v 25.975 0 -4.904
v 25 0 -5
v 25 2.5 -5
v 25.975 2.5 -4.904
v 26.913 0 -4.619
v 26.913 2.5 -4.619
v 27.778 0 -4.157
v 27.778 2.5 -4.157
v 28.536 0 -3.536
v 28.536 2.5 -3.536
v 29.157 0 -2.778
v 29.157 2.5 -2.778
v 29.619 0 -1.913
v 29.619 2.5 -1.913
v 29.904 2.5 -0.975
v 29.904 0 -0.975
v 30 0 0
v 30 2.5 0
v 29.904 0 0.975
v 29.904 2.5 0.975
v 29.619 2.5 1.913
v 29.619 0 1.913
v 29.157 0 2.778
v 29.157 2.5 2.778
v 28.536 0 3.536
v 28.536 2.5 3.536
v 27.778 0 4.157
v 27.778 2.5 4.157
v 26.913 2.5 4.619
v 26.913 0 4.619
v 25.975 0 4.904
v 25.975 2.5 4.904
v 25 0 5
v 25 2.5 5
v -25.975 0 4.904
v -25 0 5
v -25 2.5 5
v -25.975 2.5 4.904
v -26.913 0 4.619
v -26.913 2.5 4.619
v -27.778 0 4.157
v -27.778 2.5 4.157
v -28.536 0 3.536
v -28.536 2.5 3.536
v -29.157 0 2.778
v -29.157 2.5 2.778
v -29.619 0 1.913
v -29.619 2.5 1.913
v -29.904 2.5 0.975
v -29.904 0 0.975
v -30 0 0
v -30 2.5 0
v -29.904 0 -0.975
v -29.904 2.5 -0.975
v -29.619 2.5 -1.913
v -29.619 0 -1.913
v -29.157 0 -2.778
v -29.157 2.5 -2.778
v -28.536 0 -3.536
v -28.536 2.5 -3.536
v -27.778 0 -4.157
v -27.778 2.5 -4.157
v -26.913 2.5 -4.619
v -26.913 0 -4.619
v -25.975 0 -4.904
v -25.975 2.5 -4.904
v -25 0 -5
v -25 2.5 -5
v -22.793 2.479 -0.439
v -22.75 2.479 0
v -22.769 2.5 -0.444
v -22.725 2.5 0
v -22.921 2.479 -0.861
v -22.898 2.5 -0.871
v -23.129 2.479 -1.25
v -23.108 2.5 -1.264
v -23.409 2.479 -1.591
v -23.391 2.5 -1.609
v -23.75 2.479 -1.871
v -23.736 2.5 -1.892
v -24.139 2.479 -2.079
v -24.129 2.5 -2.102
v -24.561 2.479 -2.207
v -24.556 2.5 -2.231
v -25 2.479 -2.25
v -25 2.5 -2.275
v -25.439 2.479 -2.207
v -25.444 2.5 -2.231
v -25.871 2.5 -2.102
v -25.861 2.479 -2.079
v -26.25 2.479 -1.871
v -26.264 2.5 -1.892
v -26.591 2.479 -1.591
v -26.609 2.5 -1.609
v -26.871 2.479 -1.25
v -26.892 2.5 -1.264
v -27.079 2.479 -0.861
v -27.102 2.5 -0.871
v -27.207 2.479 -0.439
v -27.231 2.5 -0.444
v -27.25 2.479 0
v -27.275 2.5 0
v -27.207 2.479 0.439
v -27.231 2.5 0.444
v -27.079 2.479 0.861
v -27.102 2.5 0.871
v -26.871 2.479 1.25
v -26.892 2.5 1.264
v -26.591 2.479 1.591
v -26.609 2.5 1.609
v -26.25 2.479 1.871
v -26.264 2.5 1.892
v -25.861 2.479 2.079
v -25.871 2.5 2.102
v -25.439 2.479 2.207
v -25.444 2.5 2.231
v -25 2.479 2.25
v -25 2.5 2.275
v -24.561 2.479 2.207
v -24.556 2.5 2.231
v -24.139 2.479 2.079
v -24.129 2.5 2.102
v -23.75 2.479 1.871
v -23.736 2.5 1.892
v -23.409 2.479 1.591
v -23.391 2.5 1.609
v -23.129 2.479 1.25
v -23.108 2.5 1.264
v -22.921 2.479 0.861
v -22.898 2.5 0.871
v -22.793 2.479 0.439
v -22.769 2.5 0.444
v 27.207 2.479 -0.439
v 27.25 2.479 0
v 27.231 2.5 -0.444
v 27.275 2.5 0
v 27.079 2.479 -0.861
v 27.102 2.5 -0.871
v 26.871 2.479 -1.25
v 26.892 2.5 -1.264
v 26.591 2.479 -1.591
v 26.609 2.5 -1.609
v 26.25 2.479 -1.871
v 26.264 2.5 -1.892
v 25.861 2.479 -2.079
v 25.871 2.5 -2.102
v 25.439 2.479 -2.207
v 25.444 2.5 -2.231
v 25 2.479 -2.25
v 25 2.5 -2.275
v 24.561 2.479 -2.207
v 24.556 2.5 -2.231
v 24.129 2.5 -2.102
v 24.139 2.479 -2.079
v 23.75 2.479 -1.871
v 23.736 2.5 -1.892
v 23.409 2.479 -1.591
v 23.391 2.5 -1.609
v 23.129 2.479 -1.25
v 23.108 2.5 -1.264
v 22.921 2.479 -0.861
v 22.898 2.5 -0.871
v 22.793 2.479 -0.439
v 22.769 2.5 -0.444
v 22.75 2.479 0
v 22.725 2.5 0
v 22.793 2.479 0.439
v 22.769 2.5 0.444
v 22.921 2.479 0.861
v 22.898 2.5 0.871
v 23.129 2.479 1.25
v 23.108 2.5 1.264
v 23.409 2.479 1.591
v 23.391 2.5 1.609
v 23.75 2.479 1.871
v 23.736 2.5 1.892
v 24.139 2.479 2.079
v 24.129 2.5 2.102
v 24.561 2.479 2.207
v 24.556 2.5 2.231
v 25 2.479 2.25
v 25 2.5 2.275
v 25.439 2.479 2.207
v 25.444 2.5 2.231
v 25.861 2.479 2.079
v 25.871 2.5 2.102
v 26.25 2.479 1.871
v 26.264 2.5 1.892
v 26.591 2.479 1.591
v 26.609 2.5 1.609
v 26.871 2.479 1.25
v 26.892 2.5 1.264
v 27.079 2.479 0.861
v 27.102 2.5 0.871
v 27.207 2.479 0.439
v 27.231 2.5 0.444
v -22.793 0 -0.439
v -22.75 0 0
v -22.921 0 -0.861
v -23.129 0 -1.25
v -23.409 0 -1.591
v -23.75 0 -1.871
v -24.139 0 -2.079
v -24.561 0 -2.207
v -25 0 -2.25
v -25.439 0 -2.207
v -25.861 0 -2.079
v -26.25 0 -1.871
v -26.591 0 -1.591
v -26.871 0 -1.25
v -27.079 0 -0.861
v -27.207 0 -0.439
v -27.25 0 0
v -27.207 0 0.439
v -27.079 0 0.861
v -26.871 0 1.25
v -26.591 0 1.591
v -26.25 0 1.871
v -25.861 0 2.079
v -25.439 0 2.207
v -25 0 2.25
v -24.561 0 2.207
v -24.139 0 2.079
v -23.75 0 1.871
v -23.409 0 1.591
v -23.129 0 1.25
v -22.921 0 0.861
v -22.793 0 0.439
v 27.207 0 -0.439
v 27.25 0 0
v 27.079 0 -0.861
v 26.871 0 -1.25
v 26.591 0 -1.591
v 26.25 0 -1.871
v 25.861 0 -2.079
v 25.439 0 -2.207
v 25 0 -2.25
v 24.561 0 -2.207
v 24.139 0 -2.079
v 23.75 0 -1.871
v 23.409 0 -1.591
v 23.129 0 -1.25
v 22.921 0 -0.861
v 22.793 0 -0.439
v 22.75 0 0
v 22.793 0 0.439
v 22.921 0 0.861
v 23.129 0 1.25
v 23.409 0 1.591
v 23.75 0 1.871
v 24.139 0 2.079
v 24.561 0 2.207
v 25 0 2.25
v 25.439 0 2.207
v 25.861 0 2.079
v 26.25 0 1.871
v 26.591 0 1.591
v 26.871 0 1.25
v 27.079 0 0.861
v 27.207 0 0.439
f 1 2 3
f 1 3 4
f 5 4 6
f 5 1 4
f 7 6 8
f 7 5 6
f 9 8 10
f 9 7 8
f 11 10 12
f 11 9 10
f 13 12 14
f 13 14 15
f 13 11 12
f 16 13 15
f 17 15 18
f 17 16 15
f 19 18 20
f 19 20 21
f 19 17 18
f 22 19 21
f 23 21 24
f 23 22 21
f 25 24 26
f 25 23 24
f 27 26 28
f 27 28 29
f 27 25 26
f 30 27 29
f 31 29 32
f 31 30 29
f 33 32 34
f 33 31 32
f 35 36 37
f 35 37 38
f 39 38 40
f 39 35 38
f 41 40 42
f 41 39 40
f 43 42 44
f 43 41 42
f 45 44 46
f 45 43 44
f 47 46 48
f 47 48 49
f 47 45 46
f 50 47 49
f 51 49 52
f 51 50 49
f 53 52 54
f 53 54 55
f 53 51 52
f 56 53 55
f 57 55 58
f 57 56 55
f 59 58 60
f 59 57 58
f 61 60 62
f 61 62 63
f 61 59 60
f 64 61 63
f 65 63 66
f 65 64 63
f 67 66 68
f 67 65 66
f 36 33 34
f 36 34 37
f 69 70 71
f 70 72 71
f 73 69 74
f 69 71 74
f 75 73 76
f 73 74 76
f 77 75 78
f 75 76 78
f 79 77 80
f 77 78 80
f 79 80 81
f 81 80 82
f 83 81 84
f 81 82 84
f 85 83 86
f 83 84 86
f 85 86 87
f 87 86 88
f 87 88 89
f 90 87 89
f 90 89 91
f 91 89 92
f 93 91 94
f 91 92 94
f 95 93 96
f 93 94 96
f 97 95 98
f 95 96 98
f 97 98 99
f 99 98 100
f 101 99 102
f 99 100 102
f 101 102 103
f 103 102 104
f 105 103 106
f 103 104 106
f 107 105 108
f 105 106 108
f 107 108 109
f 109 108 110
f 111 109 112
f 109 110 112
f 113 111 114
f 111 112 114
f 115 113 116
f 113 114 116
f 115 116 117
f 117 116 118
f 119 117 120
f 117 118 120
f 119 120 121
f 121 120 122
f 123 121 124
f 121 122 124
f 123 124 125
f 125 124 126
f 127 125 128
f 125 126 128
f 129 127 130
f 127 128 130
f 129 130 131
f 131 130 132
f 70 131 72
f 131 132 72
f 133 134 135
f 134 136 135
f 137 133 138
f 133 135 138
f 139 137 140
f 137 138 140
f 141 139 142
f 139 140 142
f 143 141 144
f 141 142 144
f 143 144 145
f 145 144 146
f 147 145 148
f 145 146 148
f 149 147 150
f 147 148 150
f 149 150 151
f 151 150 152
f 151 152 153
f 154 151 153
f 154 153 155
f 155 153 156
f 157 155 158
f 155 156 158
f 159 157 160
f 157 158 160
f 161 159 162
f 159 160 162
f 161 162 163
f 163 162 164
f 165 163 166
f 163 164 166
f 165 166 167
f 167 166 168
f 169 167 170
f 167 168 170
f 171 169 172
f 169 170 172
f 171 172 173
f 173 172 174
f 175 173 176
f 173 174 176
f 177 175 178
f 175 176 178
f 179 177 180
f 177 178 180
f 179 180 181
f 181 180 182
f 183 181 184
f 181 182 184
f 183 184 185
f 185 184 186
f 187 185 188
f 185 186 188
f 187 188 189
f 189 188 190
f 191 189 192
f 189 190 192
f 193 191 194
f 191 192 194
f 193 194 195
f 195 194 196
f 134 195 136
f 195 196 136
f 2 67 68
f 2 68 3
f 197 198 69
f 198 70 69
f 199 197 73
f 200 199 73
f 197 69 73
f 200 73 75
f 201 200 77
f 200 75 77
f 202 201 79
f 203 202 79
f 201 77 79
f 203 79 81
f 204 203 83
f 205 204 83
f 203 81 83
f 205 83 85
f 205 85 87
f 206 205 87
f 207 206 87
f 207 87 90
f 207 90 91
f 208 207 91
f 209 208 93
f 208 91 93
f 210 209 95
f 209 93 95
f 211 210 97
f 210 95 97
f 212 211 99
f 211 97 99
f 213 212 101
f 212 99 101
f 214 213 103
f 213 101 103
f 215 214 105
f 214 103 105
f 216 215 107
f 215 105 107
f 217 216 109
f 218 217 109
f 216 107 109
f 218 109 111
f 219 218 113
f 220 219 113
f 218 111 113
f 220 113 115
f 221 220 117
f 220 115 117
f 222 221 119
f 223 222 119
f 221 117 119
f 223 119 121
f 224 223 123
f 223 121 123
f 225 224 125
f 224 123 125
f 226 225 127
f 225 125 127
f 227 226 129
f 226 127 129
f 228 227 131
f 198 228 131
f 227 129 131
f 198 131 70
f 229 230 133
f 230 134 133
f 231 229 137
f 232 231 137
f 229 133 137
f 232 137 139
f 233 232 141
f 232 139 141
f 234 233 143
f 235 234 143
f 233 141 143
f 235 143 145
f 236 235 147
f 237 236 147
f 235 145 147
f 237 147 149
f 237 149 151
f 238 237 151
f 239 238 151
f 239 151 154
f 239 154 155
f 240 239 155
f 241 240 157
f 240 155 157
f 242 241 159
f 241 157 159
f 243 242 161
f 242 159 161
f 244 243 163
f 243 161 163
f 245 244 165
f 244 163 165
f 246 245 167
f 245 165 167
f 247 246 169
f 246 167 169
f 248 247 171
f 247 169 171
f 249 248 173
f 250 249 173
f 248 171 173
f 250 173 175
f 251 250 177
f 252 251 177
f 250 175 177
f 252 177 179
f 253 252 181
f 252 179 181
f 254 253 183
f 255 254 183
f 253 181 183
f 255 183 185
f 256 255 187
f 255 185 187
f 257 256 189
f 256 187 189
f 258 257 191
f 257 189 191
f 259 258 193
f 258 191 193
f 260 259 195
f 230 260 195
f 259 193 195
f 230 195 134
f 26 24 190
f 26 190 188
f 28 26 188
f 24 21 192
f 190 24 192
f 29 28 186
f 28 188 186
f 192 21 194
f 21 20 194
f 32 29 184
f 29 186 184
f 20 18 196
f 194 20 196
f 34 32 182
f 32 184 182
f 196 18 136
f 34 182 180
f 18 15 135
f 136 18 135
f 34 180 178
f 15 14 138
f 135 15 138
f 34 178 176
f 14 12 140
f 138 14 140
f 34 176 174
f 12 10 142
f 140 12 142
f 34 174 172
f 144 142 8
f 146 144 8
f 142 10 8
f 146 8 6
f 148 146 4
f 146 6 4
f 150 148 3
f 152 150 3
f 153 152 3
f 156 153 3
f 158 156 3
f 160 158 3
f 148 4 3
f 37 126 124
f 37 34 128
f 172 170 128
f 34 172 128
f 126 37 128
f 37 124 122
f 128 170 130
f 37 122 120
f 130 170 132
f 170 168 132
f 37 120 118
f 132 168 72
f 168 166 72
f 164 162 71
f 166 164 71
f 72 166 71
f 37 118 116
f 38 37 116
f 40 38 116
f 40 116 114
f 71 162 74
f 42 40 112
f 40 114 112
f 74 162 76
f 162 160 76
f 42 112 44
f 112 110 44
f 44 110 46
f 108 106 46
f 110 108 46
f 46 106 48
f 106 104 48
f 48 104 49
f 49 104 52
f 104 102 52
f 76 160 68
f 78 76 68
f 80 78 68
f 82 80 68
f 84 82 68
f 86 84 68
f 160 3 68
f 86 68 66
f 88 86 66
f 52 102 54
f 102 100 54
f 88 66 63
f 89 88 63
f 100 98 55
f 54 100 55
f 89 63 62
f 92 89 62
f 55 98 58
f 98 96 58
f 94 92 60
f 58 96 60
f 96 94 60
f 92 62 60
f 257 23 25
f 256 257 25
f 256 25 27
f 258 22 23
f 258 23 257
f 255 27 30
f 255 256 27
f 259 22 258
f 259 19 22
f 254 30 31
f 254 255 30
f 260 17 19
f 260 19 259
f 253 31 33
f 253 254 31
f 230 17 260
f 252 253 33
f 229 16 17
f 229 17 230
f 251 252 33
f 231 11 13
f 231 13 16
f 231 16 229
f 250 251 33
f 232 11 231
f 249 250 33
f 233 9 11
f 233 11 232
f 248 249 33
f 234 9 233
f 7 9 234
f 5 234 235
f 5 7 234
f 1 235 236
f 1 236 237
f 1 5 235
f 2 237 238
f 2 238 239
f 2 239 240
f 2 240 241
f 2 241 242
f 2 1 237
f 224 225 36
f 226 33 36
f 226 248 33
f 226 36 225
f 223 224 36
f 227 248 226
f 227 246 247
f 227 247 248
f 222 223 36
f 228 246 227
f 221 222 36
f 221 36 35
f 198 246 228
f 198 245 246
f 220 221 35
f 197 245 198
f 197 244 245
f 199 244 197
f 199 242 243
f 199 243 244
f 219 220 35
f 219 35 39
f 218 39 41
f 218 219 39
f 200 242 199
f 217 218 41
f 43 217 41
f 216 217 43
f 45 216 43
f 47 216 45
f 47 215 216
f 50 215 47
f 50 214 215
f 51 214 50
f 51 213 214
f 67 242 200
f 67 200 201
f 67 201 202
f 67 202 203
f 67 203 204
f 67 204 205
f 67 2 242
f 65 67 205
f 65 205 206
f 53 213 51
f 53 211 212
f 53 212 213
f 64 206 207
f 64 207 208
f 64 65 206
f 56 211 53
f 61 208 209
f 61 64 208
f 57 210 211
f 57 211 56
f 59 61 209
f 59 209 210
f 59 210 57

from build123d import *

# Parameters (mm, degrees)
BOSS_EXTRUDE1_DEPTH = 2.5


# Read off the part's stored shape, not the designer's step: M4 Clearance Hole1
with BuildPart() as part:
    # Sketch1 → Boss-Extrude1 (new body)
    with BuildSketch(Plane(origin=(0, 0, 0), x_dir=(1, 0, 0), z_dir=(0, 1, 0))):
        with BuildLine():
            Line((-25, 5), (25, 5))
            ThreePointArc((25, 5), (30, 0), (25, -5))
            Line((25, -5), (-25, -5))
            ThreePointArc((-25, -5), (-30, 0), (-25, 5))
        make_face()
    extrude(amount=BOSS_EXTRUDE1_DEPTH)

    # M4 Clearance Hole1 outline → M4 Clearance Hole1 (revolve, cut)
    with BuildSketch(Plane(origin=(-25, 0, 0), x_dir=(1, 0, 0), z_dir=(0, 0, 1))):
        Polygon((0, 0), (2.25, 0), (2.25, 2.479022509), (2.275, 2.5), (0, 2.5), align=None)
    revolve(axis=Axis((-25, 0, 0), (0, 1, 0)), mode=Mode.SUBTRACT)

    # M4 Clearance Hole1 2 outline → M4 Clearance Hole1 2 (revolve, cut)
    with BuildSketch(Plane(origin=(25, 0, 0), x_dir=(1, 0, 0), z_dir=(0, 0, 1))):
        Polygon((0, 0), (2.25, 0), (2.25, 2.479022509), (2.275, 2.5), (0, 2.5), align=None)
    revolve(axis=Axis((25, 0, 0), (0, 1, 0)), mode=Mode.SUBTRACT)


solid = part.part
